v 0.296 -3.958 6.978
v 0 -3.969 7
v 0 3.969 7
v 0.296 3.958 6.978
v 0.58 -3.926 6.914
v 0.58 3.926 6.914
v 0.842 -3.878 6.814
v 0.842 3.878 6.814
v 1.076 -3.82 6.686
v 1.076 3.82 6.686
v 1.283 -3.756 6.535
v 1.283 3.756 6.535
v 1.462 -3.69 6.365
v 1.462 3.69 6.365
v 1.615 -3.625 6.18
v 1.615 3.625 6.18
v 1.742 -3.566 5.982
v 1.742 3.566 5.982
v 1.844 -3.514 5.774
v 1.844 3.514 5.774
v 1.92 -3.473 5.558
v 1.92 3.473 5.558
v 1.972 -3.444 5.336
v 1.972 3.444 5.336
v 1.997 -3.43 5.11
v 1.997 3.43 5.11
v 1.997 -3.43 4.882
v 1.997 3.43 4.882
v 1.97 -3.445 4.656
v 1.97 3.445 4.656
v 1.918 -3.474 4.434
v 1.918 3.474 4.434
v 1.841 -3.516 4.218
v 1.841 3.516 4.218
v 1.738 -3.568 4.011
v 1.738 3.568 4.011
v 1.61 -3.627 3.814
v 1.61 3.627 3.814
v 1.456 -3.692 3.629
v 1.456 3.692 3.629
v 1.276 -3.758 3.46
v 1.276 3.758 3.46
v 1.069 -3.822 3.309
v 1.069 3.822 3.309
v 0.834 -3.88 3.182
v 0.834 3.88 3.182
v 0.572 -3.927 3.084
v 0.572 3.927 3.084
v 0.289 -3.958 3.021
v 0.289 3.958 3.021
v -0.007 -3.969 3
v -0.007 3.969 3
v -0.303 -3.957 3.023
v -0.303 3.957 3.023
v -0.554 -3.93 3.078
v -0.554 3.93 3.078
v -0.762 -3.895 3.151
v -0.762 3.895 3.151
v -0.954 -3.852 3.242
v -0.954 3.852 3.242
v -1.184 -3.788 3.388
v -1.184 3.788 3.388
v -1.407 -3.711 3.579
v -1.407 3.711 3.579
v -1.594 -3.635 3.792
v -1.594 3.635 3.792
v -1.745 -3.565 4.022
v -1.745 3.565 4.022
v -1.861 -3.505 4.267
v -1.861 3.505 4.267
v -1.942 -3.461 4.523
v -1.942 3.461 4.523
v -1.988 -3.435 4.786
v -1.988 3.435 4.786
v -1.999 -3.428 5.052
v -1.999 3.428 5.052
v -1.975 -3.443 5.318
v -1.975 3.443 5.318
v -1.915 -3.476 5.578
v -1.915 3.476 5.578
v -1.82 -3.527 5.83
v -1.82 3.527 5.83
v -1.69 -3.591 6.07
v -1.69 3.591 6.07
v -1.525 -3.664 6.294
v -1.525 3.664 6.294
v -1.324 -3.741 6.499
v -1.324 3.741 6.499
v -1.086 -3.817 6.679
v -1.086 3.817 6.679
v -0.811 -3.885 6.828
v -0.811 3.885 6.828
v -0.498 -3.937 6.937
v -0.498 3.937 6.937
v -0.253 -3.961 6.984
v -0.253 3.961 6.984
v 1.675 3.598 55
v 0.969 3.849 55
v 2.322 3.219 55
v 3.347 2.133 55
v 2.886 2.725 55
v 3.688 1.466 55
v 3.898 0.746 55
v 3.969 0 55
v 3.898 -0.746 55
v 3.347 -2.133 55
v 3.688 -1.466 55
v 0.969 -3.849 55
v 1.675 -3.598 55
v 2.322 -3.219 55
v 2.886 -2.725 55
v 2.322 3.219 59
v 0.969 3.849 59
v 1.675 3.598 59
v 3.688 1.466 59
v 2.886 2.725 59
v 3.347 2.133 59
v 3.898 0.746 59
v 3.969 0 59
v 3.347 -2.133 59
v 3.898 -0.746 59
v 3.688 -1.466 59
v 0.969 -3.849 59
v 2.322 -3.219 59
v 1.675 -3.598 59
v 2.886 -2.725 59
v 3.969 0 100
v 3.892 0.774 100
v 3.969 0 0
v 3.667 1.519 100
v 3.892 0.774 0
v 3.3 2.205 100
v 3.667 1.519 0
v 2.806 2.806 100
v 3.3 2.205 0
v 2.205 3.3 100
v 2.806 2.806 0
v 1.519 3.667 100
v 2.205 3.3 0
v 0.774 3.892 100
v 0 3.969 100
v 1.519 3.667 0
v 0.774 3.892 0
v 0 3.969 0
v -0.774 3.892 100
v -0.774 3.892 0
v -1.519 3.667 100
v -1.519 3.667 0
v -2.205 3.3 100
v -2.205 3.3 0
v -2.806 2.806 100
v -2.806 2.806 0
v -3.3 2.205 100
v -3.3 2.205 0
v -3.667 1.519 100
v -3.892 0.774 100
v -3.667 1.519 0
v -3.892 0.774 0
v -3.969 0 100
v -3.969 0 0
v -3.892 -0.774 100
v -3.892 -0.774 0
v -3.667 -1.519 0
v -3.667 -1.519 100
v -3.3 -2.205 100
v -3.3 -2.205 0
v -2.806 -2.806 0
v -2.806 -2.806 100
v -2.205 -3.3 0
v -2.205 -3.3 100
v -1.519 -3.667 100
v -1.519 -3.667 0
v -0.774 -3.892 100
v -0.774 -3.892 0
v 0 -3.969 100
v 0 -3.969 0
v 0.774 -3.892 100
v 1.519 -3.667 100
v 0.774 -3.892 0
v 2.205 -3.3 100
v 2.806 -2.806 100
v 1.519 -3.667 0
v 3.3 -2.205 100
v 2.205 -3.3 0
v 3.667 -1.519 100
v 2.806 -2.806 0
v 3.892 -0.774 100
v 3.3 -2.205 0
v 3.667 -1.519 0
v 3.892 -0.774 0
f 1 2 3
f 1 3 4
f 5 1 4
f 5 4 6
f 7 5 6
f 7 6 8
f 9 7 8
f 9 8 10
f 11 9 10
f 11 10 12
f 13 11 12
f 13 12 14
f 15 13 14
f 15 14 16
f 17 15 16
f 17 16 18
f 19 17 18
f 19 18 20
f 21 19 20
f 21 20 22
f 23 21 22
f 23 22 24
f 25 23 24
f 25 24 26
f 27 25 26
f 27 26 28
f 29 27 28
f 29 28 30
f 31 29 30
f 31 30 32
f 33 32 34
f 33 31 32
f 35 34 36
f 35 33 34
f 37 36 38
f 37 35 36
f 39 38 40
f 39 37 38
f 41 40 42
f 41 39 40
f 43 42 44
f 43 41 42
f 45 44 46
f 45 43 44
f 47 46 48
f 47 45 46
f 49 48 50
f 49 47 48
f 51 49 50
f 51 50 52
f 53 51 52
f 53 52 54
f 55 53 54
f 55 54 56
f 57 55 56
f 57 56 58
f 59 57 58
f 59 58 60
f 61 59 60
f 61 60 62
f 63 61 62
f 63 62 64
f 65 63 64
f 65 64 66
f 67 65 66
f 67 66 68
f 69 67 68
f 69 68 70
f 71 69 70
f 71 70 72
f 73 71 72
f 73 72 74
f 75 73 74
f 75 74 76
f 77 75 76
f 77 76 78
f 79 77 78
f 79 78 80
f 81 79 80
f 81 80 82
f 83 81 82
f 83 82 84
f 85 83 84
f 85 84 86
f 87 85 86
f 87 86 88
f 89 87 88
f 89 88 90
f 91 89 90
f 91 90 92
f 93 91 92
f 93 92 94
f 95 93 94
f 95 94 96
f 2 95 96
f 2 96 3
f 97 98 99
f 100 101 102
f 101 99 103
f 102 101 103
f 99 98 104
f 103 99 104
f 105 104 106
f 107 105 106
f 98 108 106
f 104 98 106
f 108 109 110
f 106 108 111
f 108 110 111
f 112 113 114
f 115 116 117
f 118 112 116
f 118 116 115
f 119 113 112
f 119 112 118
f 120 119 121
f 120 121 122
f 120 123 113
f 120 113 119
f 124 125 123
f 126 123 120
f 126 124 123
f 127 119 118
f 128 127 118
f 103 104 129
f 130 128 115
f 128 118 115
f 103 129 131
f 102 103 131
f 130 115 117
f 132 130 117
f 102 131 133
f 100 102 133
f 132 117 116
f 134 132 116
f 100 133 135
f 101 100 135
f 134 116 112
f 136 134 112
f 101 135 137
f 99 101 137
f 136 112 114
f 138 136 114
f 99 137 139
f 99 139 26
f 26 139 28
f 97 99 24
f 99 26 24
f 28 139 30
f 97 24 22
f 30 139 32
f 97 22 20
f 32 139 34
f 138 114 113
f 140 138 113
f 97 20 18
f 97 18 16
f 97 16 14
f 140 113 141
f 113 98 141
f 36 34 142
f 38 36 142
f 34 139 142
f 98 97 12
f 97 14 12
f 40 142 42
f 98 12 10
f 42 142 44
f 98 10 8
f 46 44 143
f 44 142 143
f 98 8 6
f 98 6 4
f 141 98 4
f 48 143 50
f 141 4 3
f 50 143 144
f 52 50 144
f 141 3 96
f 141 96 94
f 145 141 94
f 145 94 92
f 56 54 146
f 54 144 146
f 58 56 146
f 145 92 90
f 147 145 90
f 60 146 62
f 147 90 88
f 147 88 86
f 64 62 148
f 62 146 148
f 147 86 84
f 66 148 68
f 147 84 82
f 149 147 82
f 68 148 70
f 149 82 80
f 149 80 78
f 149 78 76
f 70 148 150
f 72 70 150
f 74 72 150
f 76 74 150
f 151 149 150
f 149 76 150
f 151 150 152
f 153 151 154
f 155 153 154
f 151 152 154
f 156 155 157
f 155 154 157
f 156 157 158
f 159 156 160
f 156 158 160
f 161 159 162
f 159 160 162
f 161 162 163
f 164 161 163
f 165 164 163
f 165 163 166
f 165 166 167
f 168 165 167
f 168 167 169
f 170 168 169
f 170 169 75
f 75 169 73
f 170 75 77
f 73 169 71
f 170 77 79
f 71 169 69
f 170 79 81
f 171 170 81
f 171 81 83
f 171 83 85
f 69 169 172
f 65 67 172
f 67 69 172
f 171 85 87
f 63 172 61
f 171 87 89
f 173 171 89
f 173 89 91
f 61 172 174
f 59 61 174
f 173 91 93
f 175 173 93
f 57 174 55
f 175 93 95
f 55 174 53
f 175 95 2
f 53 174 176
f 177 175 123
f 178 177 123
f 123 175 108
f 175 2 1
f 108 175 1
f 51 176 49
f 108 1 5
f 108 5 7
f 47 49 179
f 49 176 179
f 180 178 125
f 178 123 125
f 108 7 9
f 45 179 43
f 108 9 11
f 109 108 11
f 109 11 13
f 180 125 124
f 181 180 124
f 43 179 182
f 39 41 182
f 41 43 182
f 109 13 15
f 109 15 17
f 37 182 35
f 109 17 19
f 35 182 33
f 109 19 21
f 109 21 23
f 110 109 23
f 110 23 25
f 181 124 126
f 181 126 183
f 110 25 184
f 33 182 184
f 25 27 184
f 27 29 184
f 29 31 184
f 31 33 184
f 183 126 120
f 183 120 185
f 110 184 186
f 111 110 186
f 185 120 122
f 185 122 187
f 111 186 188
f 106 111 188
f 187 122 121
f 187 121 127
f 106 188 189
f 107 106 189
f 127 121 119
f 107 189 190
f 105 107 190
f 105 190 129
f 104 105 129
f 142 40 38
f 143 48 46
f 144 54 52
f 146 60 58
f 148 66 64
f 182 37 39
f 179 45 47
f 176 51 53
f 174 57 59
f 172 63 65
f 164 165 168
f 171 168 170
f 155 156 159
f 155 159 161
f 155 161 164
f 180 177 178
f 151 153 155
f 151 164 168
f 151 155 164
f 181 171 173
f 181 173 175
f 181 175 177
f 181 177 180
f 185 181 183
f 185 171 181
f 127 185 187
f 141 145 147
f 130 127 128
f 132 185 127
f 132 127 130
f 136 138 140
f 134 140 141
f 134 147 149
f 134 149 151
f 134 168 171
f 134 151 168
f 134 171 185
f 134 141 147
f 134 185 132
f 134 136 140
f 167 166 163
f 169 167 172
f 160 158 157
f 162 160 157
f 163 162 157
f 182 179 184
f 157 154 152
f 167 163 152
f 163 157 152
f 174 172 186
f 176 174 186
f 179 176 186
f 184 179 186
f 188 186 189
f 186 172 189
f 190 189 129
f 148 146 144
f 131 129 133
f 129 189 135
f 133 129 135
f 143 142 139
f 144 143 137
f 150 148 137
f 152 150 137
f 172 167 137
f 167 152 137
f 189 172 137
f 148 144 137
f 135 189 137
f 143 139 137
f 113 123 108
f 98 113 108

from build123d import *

# Parameters (mm, degrees)
SKETCH1_R               = 3.96875
BOSS_EXTRUDE1_DEPTH     = 100
CUT_EXTRUDE2_DEPTH      = 101.157385914
CUT_EXTRUDE2_DEPTH_BACK = 101.157385914
SKETCH3_R               = 2
CUT_EXTRUDE3_DEPTH      = 101.157386022
CUT_EXTRUDE3_DEPTH_BACK = 101.157386022
SKETCH5_W               = 3
SKETCH5_H               = 4


with BuildPart() as part:
    # Sketch1 → Boss-Extrude1 (new body)
    with BuildSketch(Plane.XY):
        Circle(SKETCH1_R)
    extrude(amount=BOSS_EXTRUDE1_DEPTH)

    # Sketch3 → Cut-Extrude2 (cut, two sides: drawn at the far end of the back side and taken through both)
    with BuildSketch(Plane(origin=(0, 0, 0), x_dir=(1, 0, 0), z_dir=(0, 1, 0)).offset(-CUT_EXTRUDE2_DEPTH_BACK)):
        with Locations((0, -5)):
            Circle(SKETCH3_R)
    extrude(amount=CUT_EXTRUDE2_DEPTH + CUT_EXTRUDE2_DEPTH_BACK, mode=Mode.SUBTRACT)

    # Sketch5 → Cut-Extrude3 (cut, two sides: drawn at the far end of the back side and taken through both)
    with BuildSketch(Plane(origin=(0, 0, 0), x_dir=(1, 0, 0), z_dir=(0, 1, 0)).offset(-CUT_EXTRUDE3_DEPTH_BACK)):
        with Locations((2.46875, -57)):
            Rectangle(SKETCH5_W, SKETCH5_H)
    extrude(amount=CUT_EXTRUDE3_DEPTH + CUT_EXTRUDE3_DEPTH_BACK, mode=Mode.SUBTRACT)


solid = part.part
